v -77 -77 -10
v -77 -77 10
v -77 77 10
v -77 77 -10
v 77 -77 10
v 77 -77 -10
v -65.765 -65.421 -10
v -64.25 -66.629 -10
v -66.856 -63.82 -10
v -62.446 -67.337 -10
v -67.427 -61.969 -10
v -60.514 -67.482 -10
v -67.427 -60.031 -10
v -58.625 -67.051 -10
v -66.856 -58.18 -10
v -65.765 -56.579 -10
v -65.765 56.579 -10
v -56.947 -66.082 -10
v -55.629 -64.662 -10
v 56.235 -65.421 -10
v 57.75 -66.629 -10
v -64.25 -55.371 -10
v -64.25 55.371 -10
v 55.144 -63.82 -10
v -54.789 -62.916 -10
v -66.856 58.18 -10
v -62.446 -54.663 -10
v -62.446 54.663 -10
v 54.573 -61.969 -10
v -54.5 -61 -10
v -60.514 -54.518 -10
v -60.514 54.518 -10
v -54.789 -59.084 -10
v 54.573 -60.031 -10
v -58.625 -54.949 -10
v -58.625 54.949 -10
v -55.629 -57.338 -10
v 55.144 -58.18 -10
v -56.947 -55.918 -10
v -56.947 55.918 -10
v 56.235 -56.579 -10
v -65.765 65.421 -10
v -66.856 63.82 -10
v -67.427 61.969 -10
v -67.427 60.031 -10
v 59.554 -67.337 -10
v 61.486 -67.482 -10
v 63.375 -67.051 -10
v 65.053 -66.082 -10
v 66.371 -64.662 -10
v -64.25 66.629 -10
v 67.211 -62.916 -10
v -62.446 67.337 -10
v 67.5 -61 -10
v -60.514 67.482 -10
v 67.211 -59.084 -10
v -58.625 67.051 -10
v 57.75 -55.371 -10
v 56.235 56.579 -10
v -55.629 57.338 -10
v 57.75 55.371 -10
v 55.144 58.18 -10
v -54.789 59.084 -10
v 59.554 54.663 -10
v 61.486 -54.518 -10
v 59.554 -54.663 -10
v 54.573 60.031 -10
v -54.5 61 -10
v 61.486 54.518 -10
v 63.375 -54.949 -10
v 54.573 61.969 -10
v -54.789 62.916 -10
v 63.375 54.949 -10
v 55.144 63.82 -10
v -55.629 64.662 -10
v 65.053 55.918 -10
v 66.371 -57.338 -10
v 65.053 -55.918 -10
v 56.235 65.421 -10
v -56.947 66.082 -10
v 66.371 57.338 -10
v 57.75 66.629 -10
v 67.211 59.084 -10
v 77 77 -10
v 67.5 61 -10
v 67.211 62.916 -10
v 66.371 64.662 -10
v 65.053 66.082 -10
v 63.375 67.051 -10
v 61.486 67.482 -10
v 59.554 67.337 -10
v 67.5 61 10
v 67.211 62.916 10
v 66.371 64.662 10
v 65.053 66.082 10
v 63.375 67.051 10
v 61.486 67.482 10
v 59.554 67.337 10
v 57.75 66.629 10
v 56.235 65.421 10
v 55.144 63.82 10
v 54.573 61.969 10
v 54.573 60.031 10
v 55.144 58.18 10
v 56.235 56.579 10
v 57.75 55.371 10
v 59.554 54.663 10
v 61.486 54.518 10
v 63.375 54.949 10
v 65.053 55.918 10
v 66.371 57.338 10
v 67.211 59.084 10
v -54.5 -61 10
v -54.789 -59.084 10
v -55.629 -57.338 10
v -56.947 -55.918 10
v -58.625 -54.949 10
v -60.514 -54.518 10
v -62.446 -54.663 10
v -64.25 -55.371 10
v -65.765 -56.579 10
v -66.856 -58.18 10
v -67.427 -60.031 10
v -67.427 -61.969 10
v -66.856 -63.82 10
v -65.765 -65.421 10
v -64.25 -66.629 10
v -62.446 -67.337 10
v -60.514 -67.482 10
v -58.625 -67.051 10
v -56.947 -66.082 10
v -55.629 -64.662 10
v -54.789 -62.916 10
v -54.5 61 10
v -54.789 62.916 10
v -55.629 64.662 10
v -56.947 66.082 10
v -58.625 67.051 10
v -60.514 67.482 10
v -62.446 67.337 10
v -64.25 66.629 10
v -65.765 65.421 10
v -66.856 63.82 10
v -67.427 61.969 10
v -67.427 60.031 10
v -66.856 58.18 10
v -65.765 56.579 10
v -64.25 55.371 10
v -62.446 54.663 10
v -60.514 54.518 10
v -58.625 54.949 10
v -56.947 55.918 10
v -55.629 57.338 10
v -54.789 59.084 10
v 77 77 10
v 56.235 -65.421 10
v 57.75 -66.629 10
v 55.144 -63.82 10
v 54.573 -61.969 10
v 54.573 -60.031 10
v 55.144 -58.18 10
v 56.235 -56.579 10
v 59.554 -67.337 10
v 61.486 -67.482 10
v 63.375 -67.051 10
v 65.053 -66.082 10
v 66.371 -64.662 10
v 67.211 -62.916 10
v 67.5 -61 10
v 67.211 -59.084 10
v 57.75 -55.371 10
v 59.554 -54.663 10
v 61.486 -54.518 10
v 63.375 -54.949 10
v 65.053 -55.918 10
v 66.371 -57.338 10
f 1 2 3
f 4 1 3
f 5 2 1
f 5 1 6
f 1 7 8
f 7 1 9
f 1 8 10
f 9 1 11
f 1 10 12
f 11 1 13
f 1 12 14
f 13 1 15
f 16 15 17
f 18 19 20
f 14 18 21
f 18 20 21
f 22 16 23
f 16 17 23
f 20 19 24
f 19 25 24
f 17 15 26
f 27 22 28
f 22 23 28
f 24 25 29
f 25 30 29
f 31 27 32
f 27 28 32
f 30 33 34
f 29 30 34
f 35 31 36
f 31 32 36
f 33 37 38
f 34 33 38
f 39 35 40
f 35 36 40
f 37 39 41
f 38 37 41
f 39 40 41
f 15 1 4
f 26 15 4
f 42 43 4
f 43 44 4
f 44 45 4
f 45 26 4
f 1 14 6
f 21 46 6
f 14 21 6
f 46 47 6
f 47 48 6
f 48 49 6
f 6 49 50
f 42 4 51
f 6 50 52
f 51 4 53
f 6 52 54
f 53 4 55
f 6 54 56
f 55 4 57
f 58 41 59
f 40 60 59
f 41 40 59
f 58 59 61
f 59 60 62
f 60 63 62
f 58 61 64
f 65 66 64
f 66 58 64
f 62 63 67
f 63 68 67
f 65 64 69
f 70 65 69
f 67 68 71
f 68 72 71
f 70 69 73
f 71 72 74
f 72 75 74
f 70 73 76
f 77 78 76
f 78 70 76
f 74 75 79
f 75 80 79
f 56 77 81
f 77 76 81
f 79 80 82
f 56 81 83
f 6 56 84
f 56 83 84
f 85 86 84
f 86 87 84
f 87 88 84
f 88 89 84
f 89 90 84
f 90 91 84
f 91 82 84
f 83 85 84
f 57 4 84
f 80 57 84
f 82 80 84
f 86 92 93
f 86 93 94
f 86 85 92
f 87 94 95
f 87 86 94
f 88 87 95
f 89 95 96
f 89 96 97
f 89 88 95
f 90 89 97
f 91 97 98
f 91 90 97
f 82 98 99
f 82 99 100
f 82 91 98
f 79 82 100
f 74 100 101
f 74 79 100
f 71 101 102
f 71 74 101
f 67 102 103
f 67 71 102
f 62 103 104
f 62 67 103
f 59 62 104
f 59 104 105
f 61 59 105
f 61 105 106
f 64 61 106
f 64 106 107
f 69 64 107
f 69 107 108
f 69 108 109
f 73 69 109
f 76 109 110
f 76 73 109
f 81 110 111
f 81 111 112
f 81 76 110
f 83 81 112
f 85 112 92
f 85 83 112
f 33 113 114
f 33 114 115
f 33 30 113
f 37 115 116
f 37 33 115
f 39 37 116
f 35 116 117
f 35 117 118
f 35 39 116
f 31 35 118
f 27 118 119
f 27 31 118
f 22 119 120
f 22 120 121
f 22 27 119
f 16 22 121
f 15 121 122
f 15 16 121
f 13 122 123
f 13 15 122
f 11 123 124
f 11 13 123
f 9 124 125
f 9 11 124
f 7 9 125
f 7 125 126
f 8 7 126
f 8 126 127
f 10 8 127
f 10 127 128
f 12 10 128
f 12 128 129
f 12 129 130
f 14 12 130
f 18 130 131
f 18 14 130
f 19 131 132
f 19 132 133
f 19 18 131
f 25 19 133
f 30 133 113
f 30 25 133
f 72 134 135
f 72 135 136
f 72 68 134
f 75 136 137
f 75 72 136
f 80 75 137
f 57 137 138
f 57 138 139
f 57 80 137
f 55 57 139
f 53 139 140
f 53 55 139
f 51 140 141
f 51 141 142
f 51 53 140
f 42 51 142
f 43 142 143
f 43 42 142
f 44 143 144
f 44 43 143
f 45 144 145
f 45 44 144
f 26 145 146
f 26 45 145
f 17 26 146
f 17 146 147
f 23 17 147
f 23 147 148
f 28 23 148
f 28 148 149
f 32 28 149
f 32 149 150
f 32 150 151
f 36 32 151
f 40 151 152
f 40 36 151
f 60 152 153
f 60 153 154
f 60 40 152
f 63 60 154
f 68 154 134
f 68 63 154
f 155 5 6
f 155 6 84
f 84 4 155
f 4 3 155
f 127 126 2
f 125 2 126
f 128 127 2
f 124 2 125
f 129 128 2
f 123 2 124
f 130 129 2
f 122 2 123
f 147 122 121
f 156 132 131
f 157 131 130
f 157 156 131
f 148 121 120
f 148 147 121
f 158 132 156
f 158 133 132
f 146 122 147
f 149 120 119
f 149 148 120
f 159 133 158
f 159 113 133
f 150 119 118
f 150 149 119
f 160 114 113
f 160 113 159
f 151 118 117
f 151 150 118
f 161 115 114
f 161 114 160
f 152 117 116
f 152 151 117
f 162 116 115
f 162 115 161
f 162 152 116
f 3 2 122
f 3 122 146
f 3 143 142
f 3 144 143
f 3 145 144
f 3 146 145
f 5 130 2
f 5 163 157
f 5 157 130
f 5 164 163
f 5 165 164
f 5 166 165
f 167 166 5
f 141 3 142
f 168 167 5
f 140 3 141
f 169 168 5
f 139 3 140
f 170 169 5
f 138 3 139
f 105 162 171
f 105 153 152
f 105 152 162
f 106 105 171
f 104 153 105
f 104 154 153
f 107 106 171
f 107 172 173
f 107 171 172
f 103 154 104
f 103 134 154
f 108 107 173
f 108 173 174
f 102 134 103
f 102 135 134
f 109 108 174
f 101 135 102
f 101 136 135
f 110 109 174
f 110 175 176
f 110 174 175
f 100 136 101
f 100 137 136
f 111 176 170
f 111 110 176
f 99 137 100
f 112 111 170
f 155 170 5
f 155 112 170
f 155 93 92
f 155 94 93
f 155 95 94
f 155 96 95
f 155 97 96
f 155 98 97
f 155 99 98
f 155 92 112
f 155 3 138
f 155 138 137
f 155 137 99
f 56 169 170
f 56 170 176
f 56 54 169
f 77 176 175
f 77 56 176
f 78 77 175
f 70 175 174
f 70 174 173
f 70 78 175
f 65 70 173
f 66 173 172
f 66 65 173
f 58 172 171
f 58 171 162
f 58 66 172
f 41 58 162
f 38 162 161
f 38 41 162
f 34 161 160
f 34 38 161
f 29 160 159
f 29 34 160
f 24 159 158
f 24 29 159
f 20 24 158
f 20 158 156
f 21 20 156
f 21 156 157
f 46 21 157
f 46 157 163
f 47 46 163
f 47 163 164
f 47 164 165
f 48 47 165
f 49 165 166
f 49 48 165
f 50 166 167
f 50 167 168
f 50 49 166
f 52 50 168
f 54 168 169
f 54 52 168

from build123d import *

# Parameters (mm, degrees)
SKETCH1_W           = 154
SKETCH1_H           = 154
SKETCH1_R           = 6.5
BOSS_EXTRUDE1_DEPTH = 10


with BuildPart() as part:
    # Sketch1 → Boss-Extrude1 (new body, symmetric)
    with BuildSketch(Plane.XY):
        Rectangle(SKETCH1_W, SKETCH1_H)
        with Locations((-61, 61)):
            Circle(SKETCH1_R, mode=Mode.SUBTRACT)
        with Locations((61, 61)):
            Circle(SKETCH1_R, mode=Mode.SUBTRACT)
        with Locations((-61, -61)):
            Circle(SKETCH1_R, mode=Mode.SUBTRACT)
        with Locations((61, -61)):
            Circle(SKETCH1_R, mode=Mode.SUBTRACT)
    extrude(amount=BOSS_EXTRUDE1_DEPTH, both=True)


solid = part.part
